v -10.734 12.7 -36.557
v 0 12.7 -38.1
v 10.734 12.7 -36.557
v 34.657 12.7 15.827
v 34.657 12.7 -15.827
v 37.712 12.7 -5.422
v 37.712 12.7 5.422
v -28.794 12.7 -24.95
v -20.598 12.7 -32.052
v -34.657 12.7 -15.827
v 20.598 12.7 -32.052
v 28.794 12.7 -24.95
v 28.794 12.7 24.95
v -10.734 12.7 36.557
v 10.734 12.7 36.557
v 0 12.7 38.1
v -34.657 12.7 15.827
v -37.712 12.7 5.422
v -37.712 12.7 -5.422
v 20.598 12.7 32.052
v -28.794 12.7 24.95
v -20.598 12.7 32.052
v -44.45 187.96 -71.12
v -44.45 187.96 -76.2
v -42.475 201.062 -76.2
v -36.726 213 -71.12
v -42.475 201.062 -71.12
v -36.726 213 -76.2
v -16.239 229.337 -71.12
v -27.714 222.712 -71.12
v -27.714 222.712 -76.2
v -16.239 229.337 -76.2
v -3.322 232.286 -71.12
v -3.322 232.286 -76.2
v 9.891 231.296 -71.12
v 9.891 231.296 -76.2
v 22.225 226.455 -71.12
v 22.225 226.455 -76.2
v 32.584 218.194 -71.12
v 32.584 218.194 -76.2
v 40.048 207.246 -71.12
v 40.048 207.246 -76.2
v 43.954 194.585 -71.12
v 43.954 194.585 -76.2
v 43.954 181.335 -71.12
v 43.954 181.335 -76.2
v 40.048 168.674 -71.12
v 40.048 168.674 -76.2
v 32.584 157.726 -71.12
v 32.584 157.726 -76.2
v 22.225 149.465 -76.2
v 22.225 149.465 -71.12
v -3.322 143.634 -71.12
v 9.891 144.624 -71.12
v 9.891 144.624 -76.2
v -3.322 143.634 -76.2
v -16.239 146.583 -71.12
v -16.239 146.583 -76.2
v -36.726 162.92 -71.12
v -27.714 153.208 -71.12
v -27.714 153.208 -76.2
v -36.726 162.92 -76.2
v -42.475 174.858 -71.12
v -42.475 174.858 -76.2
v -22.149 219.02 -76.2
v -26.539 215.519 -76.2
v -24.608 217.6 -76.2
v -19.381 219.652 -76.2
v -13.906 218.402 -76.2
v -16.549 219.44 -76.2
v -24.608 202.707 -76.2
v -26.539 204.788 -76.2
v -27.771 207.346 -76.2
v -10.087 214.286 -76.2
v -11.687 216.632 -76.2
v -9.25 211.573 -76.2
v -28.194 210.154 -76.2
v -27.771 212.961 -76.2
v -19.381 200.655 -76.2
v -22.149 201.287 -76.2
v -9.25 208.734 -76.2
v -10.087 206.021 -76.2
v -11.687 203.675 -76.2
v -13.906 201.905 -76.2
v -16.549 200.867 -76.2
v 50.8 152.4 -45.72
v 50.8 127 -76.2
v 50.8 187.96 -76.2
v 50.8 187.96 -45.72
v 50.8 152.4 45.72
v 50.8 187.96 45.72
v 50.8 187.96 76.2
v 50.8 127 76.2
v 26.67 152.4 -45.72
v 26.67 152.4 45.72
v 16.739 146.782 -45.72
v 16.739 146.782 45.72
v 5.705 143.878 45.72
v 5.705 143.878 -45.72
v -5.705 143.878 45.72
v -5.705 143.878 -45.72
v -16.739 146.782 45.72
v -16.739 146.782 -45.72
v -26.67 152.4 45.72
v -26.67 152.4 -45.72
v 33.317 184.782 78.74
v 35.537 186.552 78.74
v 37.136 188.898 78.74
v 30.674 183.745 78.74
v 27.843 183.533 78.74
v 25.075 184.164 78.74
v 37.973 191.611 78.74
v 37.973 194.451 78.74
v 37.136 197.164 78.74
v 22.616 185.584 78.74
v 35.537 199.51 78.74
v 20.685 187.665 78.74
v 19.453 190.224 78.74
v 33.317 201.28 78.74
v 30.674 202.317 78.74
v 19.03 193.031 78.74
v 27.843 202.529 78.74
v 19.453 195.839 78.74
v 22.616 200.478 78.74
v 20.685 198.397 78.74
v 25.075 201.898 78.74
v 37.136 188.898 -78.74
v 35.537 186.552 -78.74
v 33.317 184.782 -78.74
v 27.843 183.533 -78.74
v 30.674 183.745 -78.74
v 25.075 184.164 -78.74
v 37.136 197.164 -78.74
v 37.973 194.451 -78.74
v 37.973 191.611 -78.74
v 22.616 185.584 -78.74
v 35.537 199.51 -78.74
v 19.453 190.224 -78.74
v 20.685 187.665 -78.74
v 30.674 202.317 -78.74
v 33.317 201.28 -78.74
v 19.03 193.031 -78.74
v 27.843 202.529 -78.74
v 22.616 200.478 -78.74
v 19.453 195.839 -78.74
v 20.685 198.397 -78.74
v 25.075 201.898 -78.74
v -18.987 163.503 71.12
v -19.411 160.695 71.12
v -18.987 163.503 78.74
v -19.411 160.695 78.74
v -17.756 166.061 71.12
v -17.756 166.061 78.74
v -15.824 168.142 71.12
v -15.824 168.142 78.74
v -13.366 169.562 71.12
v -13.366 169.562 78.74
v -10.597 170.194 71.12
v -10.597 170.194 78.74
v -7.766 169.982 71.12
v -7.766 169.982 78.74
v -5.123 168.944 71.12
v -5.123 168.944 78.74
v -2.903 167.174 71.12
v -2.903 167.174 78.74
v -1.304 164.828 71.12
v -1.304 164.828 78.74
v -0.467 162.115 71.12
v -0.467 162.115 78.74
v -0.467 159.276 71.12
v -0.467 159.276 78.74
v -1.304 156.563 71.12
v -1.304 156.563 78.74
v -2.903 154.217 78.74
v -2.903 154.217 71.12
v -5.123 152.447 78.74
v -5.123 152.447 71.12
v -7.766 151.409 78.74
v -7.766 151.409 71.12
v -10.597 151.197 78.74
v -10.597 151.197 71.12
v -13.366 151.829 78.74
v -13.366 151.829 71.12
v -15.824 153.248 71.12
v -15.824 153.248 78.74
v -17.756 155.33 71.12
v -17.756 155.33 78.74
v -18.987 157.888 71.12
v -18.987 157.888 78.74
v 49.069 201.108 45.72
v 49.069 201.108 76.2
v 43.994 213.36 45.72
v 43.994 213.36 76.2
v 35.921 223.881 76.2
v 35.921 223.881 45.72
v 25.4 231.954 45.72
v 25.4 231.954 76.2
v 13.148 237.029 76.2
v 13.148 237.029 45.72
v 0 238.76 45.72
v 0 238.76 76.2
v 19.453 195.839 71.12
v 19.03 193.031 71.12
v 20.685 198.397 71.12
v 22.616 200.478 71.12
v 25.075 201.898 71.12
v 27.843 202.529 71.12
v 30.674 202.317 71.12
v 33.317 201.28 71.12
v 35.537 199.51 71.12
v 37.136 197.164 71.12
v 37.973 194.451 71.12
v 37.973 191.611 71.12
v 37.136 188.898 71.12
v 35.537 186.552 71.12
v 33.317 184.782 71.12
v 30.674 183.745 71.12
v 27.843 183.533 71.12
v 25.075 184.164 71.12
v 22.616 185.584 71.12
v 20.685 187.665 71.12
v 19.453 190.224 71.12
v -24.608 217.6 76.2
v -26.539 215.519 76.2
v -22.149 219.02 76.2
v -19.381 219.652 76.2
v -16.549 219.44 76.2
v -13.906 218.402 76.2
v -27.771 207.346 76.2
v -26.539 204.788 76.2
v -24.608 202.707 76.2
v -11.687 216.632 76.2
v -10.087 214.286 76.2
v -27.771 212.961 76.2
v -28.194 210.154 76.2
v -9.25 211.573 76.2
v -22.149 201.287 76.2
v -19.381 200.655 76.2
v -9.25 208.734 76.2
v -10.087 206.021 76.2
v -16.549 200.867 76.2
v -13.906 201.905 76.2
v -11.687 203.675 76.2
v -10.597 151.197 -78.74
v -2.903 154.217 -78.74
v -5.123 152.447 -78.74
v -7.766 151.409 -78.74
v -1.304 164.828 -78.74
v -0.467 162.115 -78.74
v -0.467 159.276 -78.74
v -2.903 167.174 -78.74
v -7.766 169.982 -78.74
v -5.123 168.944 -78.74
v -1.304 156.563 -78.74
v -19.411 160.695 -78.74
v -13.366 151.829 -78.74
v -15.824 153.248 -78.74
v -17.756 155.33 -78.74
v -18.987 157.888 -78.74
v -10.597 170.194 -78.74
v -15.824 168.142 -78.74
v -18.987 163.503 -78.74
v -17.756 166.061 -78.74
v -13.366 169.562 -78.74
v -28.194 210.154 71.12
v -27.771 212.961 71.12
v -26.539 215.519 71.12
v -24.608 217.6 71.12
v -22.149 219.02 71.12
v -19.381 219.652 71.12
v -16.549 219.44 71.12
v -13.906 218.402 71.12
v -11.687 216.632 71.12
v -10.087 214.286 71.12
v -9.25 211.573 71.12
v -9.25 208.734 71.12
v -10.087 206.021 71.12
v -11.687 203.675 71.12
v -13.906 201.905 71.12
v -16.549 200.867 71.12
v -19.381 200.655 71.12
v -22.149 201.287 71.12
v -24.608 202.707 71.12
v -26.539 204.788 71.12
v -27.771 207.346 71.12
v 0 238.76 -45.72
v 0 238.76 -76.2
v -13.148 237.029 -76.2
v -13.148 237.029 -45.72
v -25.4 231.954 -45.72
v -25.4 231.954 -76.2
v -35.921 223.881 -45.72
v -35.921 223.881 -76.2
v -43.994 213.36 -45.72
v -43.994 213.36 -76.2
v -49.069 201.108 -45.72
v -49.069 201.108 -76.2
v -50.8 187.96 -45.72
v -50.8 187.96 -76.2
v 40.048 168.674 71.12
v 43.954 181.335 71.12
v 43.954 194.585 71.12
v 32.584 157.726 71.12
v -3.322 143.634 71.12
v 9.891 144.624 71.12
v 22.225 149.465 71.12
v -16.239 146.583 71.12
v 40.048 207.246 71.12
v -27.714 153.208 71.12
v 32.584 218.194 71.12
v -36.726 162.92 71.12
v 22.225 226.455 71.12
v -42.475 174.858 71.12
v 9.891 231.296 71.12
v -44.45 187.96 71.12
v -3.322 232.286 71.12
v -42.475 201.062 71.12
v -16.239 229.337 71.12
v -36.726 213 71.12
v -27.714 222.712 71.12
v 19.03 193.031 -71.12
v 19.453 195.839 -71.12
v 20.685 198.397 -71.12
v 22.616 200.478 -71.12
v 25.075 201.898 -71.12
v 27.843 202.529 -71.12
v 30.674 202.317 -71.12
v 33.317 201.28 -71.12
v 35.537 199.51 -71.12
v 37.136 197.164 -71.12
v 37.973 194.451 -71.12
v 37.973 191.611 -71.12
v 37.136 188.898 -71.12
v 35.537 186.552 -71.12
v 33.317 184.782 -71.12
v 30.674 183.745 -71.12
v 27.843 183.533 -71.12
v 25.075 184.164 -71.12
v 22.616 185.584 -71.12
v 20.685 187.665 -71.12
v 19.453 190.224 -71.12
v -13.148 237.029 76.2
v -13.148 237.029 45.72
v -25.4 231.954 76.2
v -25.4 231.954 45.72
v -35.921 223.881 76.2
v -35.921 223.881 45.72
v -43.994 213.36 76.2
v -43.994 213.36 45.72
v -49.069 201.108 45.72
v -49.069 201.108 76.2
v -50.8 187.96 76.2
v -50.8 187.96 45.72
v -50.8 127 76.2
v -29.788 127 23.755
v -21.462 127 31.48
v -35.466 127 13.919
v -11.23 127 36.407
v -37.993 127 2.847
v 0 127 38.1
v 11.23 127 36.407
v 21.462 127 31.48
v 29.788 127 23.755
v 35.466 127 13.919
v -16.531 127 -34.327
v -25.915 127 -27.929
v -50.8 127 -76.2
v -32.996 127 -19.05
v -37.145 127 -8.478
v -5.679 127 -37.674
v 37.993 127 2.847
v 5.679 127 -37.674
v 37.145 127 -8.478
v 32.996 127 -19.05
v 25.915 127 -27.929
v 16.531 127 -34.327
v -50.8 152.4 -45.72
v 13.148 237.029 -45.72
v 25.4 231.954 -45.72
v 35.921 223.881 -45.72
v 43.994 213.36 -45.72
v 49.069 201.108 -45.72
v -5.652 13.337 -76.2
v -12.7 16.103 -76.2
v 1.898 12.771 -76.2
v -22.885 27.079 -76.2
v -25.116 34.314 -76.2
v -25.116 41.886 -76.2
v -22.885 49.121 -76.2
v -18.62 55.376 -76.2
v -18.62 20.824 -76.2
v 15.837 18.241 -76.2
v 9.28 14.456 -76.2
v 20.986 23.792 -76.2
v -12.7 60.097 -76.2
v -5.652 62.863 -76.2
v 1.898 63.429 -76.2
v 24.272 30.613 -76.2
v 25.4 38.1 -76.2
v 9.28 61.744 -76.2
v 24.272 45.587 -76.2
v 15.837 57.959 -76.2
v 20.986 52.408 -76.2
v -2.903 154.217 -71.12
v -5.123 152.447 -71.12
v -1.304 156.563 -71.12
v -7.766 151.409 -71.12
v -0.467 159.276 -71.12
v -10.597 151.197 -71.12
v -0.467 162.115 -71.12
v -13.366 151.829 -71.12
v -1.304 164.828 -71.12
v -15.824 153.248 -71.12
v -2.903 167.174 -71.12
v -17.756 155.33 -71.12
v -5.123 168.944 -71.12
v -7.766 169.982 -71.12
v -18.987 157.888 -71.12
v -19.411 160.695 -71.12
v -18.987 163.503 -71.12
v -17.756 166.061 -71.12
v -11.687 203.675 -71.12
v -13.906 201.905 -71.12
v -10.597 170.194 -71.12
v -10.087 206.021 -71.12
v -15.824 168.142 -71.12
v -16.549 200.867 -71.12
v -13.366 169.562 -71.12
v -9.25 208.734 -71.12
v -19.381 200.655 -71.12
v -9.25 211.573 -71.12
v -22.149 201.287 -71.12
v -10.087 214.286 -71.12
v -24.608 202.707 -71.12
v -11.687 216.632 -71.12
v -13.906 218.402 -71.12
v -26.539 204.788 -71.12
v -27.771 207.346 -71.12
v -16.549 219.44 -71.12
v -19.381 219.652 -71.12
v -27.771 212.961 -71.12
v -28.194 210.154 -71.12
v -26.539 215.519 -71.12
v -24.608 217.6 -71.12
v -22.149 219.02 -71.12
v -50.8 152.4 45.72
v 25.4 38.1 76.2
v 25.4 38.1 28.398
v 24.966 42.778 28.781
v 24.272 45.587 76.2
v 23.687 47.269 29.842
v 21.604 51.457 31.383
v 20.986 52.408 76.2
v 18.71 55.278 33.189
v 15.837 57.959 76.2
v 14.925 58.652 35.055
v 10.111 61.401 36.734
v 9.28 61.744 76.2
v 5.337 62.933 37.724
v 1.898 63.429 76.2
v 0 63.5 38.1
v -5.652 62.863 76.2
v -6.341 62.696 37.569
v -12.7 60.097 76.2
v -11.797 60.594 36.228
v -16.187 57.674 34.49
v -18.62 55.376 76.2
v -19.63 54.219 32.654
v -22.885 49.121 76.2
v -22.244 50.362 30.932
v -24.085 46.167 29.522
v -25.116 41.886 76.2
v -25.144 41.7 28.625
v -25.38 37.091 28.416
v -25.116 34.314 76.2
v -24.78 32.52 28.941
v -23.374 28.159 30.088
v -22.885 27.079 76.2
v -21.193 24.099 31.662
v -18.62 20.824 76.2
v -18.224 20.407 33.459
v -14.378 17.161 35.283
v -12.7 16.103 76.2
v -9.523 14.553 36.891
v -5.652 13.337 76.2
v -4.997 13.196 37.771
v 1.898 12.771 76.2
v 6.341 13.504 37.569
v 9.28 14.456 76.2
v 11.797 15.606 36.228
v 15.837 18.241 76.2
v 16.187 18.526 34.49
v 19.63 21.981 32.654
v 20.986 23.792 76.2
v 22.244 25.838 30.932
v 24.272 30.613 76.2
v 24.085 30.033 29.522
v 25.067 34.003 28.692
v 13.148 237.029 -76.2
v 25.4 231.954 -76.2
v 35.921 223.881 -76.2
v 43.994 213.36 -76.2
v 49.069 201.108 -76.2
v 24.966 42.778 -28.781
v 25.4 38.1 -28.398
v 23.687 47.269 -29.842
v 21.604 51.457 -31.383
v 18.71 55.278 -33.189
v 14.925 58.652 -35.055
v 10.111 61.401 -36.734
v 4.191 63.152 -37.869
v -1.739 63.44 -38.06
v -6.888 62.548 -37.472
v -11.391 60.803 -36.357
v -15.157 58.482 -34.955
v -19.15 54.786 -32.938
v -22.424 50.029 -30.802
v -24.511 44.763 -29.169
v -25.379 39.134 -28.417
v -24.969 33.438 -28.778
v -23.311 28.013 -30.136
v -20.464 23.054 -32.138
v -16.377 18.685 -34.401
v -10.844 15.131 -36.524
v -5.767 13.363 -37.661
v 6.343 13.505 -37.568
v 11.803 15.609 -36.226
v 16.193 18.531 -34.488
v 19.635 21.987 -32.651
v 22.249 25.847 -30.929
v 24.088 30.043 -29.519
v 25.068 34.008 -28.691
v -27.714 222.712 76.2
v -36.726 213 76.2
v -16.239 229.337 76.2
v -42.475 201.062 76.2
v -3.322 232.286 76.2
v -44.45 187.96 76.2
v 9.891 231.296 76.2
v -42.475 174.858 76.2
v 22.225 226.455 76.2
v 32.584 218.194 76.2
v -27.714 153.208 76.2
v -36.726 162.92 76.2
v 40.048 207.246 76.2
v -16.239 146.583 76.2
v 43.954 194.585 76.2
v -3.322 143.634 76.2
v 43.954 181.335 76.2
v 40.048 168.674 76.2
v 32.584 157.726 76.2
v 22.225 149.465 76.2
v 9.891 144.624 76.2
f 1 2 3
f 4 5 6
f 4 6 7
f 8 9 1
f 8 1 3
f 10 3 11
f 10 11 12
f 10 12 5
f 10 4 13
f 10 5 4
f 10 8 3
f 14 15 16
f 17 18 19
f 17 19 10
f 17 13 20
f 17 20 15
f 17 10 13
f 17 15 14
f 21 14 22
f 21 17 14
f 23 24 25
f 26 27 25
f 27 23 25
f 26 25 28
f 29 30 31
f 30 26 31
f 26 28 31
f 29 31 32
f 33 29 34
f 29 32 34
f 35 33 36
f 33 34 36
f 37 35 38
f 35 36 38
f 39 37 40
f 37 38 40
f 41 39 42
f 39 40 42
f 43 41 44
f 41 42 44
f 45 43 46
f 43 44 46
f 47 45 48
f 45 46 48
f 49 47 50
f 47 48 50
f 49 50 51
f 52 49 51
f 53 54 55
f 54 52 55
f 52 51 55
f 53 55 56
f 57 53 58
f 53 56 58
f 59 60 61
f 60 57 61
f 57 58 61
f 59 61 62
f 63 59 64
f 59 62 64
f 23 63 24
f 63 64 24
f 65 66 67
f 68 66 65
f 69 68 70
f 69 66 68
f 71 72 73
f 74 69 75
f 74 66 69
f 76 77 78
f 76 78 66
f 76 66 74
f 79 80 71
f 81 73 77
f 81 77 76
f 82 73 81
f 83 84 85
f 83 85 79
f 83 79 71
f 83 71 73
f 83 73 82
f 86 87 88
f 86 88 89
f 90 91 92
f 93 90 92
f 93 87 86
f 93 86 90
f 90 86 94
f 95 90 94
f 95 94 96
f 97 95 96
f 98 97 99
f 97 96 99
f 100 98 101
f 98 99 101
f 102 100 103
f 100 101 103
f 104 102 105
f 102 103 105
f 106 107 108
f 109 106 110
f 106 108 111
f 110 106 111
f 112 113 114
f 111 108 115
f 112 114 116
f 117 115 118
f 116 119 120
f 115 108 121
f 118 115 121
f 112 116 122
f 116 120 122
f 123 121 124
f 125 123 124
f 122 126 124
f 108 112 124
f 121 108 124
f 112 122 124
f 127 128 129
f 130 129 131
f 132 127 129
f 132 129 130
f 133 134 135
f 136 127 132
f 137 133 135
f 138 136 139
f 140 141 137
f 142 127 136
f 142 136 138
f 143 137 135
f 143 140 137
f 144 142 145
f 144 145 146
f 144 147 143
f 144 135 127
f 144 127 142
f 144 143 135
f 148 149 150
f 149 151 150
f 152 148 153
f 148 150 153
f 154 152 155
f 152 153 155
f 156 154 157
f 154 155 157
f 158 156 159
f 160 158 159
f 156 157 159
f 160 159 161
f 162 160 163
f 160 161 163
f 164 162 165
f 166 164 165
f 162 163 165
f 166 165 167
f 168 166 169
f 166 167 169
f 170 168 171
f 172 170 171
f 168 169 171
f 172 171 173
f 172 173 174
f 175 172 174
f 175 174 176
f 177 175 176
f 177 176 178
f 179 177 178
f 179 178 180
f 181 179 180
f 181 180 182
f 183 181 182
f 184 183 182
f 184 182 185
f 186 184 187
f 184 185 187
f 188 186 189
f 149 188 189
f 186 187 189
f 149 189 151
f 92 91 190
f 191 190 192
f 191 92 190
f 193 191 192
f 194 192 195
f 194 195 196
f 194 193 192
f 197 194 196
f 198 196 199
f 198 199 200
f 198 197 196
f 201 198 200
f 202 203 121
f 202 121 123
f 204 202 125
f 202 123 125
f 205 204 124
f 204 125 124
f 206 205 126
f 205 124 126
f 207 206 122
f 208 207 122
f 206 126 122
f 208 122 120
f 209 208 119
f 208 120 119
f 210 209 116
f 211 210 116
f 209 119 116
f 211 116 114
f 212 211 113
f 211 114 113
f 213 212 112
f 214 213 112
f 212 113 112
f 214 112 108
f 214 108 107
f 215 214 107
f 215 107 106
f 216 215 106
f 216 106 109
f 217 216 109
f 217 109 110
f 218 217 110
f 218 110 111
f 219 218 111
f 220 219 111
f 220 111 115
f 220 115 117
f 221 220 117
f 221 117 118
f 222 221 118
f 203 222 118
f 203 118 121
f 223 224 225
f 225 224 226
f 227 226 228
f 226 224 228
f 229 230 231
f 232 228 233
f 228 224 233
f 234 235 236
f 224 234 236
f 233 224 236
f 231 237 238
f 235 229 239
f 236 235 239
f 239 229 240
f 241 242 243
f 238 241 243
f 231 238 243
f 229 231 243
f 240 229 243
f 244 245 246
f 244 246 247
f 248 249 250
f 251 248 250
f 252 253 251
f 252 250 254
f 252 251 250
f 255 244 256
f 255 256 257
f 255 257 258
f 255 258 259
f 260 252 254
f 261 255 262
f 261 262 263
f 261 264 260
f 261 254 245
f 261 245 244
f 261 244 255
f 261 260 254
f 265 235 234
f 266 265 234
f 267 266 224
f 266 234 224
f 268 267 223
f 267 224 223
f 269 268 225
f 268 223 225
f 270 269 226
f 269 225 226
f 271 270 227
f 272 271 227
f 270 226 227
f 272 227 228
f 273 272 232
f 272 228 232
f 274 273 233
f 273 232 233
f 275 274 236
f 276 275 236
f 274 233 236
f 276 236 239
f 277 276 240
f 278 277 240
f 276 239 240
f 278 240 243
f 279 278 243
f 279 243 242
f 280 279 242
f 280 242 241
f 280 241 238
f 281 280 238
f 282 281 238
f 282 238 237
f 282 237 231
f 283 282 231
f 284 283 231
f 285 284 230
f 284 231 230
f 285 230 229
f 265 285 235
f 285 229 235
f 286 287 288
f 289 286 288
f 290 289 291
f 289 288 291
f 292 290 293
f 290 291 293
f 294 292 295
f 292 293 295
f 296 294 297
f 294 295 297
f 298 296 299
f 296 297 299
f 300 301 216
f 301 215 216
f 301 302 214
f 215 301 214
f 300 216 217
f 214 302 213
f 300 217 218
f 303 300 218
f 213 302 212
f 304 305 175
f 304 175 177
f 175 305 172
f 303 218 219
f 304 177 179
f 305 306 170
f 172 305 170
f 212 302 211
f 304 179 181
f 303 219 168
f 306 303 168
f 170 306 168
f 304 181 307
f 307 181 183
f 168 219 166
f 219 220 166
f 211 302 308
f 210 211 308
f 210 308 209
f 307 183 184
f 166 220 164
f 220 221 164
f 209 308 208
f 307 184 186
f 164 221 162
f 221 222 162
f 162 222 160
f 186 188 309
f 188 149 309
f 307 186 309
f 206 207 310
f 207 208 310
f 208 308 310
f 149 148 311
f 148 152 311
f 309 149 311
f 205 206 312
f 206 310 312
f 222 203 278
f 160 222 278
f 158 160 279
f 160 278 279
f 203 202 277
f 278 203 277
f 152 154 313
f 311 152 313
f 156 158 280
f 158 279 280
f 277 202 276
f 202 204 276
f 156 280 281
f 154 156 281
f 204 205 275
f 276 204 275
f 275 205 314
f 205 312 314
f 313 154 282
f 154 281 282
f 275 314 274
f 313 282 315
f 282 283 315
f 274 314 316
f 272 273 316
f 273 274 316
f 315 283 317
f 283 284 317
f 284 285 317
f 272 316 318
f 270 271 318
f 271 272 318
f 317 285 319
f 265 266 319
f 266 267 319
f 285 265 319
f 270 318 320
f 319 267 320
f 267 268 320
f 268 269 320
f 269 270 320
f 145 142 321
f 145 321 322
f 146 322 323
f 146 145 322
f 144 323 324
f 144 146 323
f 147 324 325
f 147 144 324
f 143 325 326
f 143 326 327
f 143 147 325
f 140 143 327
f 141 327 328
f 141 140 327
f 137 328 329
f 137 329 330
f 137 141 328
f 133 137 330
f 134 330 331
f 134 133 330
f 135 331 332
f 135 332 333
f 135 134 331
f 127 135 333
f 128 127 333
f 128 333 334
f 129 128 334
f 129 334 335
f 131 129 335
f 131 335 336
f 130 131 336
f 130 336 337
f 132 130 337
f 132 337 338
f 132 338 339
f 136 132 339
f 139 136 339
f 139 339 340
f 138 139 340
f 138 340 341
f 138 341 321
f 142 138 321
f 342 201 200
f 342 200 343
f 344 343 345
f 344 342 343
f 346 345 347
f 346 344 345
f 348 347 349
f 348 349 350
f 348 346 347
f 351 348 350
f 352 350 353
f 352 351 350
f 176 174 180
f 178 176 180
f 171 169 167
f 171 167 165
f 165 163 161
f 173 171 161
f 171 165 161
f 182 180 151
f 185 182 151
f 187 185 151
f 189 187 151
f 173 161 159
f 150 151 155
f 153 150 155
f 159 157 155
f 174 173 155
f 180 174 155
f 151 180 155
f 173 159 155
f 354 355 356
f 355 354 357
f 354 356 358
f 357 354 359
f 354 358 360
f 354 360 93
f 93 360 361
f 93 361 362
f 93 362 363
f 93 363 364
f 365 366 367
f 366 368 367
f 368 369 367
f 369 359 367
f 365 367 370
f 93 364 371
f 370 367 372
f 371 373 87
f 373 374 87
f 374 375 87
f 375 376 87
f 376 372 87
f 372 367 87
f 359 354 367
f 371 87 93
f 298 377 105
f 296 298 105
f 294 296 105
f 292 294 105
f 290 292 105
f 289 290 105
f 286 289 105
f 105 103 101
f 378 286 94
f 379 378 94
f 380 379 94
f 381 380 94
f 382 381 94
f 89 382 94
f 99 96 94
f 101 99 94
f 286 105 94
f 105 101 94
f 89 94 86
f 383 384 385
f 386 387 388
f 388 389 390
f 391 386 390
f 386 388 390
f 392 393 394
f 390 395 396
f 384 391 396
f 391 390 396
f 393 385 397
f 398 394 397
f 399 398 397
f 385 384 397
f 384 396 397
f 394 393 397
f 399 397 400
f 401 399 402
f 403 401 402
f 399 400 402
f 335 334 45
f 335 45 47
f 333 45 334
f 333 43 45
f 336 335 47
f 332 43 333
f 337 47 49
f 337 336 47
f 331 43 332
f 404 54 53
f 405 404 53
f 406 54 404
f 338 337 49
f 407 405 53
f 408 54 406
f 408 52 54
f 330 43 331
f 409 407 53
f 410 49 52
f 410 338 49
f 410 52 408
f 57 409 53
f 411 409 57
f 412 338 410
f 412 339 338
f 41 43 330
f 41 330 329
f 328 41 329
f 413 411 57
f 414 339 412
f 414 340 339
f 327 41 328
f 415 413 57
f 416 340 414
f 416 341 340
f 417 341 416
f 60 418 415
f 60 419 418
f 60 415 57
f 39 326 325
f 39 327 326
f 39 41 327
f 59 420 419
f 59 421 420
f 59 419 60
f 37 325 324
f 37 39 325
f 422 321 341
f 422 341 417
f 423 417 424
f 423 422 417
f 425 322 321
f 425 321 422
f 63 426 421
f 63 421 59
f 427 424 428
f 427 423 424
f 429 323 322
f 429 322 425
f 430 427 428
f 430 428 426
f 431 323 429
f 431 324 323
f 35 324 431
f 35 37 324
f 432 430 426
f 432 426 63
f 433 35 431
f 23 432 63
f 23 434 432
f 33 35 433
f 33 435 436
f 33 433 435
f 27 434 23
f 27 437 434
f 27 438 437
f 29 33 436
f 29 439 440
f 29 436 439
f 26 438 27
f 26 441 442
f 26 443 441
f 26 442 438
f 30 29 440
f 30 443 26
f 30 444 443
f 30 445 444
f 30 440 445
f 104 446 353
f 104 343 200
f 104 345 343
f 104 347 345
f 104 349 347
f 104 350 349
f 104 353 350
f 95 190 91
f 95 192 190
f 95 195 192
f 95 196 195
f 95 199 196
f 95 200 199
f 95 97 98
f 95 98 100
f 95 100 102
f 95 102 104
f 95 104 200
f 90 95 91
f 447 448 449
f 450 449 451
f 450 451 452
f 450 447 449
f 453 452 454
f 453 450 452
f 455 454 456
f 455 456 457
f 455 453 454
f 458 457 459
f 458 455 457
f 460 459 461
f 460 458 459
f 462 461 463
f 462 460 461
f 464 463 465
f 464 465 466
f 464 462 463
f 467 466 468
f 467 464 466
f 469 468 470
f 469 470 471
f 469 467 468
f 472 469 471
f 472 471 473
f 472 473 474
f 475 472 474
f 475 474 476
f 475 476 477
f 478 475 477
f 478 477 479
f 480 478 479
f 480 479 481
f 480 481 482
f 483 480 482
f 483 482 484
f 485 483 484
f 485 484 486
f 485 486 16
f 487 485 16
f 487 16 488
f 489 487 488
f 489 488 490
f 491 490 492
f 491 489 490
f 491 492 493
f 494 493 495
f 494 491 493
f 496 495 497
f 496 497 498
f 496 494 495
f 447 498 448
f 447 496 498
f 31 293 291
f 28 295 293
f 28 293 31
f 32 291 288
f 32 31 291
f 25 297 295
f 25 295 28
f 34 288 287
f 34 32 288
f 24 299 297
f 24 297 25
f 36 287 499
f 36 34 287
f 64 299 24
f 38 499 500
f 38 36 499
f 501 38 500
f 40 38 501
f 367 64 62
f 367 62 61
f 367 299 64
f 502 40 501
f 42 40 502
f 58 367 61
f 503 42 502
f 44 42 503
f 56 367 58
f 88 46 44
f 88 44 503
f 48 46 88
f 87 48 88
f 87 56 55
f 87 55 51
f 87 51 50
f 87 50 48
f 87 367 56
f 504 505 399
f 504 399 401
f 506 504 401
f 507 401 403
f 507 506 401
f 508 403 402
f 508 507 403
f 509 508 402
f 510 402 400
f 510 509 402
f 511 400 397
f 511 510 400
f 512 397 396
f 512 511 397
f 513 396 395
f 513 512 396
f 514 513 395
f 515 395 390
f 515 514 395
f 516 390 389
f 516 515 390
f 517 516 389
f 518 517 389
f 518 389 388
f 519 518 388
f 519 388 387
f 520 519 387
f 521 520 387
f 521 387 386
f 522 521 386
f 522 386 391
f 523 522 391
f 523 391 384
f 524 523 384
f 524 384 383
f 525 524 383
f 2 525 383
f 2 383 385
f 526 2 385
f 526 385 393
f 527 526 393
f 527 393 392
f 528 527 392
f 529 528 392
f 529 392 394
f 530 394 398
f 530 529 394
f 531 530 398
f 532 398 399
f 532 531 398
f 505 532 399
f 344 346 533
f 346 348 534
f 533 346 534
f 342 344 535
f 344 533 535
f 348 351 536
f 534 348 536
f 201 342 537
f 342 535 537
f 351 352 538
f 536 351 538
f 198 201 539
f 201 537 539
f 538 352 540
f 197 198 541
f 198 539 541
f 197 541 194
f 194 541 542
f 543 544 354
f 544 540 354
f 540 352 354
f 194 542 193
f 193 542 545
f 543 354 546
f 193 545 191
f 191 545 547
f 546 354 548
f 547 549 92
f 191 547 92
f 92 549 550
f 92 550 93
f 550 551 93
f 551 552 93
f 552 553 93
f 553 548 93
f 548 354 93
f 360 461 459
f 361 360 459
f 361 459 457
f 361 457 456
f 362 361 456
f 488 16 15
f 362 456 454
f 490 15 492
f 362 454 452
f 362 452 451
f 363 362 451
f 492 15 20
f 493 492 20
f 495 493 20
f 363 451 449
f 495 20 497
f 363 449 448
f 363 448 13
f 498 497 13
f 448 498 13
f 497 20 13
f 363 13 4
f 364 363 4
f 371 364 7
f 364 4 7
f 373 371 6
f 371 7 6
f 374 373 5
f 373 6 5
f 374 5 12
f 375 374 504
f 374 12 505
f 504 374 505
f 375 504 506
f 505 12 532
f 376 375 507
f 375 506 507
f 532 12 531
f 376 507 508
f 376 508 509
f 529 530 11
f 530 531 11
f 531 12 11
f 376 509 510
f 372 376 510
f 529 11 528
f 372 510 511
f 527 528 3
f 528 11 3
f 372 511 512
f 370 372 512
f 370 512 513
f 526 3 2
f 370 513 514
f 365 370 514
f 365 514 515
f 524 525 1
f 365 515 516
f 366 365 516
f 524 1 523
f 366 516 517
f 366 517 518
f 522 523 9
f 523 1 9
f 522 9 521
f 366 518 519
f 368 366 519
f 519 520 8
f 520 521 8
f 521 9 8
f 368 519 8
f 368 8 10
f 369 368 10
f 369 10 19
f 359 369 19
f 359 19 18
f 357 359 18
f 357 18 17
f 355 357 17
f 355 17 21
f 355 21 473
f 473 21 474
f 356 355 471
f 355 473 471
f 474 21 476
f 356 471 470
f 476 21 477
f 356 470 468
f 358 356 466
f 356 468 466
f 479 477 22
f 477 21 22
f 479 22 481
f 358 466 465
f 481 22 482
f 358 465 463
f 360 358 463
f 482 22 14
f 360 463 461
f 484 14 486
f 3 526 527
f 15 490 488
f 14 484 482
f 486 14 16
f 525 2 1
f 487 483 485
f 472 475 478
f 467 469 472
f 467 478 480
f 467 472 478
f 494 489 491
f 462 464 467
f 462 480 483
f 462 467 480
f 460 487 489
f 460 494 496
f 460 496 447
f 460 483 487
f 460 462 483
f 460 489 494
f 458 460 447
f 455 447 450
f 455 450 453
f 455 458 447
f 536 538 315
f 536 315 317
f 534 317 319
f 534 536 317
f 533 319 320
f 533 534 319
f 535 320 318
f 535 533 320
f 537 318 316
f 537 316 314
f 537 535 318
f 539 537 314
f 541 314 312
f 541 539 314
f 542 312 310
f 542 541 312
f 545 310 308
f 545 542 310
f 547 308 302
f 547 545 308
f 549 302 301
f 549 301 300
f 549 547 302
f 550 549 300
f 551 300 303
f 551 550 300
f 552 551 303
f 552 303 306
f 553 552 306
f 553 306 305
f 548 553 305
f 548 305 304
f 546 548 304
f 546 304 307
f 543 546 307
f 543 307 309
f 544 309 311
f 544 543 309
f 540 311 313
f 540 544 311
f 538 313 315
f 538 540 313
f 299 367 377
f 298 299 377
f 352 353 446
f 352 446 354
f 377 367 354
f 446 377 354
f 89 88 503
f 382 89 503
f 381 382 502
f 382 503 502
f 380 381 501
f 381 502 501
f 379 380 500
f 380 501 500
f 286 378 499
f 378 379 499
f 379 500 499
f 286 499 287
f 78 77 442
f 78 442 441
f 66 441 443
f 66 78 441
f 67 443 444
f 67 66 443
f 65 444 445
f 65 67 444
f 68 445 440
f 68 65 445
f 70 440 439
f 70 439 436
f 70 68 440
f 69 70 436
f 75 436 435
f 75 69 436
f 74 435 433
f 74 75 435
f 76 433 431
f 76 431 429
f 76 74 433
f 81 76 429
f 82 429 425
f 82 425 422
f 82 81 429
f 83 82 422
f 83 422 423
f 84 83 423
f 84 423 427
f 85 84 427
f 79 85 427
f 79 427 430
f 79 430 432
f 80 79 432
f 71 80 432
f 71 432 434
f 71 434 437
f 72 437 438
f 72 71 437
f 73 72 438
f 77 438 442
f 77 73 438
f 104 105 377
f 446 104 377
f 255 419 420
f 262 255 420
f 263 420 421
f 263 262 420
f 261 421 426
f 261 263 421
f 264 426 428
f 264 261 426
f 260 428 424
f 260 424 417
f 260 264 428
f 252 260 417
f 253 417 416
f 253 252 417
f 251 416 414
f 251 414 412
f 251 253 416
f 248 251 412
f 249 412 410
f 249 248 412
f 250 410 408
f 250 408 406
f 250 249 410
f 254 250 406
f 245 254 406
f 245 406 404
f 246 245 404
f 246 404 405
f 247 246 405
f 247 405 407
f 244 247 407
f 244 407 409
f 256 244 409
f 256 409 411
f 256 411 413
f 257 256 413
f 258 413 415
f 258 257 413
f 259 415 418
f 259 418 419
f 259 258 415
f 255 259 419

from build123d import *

# Parameters (mm, degrees)
SKETCH1_R           = 38.1
BOSS_EXTRUDE1_DEPTH = 127
SKETCH3_R           = 25.4
BOSS_EXTRUDE2_DEPTH = 152.4
SKETCH4_W           = 101.6
SKETCH4_H           = 152.4
BOSS_EXTRUDE3_DEPTH = 10.16
SKETCH5_W           = 101.6
SKETCH5_H           = 30.48
BOSS_EXTRUDE4_DEPTH = 101.6
CUT_EXTRUDE1_DEPTH  = 101.6
SKETCH8_R           = 44.45
SKETCH8_R_2         = 9.525
CUT_EXTRUDE3_DEPTH  = 5.08
BOSS_EXTRUDE6_START = 2.54
SKETCH8_6_R         = 9.525
BOSS_EXTRUDE6_DEPTH = 2.54
BOSS_EXTRUDE7_DEPTH = 121.92
SKETCH11_R          = 38.1
CUT_EXTRUDE5_DEPTH  = 12.7


with BuildPart() as part:
    # Sketch1 → Boss-Extrude1 (new body)
    with BuildSketch(Plane(origin=(0, 0, 0), x_dir=(1, 0, 0), z_dir=(0, 1, 0))):
        with Locations(Location((0, 0, 0), (0, 0, 270))):
            Circle(SKETCH1_R)
    extrude(amount=BOSS_EXTRUDE1_DEPTH)

    # Sketch3 → Boss-Extrude2 (add)
    with BuildSketch(Plane.XY.offset(76.2)):
        with Locations((0, 38.1)):
            Circle(SKETCH3_R)
    extrude(amount=-BOSS_EXTRUDE2_DEPTH)

    # Sketch4 → Boss-Extrude3 (add)
    with BuildSketch(Plane(origin=(0, 127, 0), x_dir=(1, 0, 0), z_dir=(0, 1, 0))):
        Rectangle(SKETCH4_W, SKETCH4_H)
    extrude(amount=BOSS_EXTRUDE3_DEPTH)

    # Sketch5 → Boss-Extrude4 (add)
    with BuildSketch(Plane(origin=(0, 137.16, 0), x_dir=(1, 0, 0), z_dir=(0, 1, 0))):
        with Locations((0, 60.96)):
            Rectangle(SKETCH5_W, SKETCH5_H)
    boss_extrude4 = extrude(amount=BOSS_EXTRUDE4_DEPTH)

    # Sketch7 → Cut-Extrude1 (cut)
    with BuildSketch(Plane(origin=(0, 0, -76.2), x_dir=(-1, 0, 0), z_dir=(0, 0, -1))):
        with BuildLine():
            ThreePointArc((-50.8, 187.96), (-35.92102454, 223.881024429), (-1.57e-07, 238.76))
            Line((-1.57e-07, 238.76), (-50.8, 238.76))
            Line((-50.8, 238.76), (-50.8, 187.96))
        make_face()
        with BuildLine():
            Line((50.8, 187.96), (50.8, 238.76))
            Line((50.8, 238.76), (-1.57e-07, 238.76))
            ThreePointArc((-1.57e-07, 238.76), (35.921024429, 223.88102454), (50.8, 187.96))
        make_face()
    cut_extrude1 = extrude(amount=-CUT_EXTRUDE1_DEPTH, mode=Mode.SUBTRACT)

    # Sketch8 → Cut-Extrude3 (cut)
    with BuildSketch(Plane(origin=(0, 0, -76.2), x_dir=(-1, 0, 0), z_dir=(0, 0, -1))):
        with Locations((0, 187.96)):
            Circle(SKETCH8_R)
        with Locations((-28.554667319, 193.031059488)):
            Circle(SKETCH8_R_2, mode=Mode.SUBTRACT)
        with Locations((9.885667319, 160.695402961)):
            Circle(SKETCH8_R_2, mode=Mode.SUBTRACT)
        with Locations((18.669, 210.153537551)):
            Circle(SKETCH8_R_2, mode=Mode.SUBTRACT)
    cut_extrude3 = extrude(amount=-CUT_EXTRUDE3_DEPTH, mode=Mode.SUBTRACT)

    # Sketch8<6> → Boss-Extrude6 (add)
    with BuildSketch(Plane(origin=(0, 0, -76.2), x_dir=(-1, 0, 0), z_dir=(0, 0, -1)).offset(BOSS_EXTRUDE6_START)):
        with Locations((-28.554667319, 193.031059488)):
            Circle(SKETCH8_6_R)
        with Locations((9.885667319, 160.695402961)):
            Circle(SKETCH8_6_R)
    boss_extrude6 = extrude(amount=-BOSS_EXTRUDE6_DEPTH)

    # Mirror2: Boss-Extrude4, Cut-Extrude1, Cut-Extrude3, Boss-Extrude6 across plane
    add(boss_extrude4.mirror(Plane.XY))
    add(cut_extrude1.mirror(Plane.XY), mode=Mode.SUBTRACT)
    add(cut_extrude3.mirror(Plane.XY), mode=Mode.SUBTRACT)
    add(boss_extrude6.mirror(Plane.XY))

    # Sketch10 → Boss-Extrude7 (add)
    with BuildSketch(Plane(origin=(0, 0, -76.2), x_dir=(-1, 0, 0), z_dir=(0, 0, -1))):
        with BuildLine():
            Line((-50.8, 152.4), (-26.67, 152.4))
            ThreePointArc((-26.67, 152.4), (0, 143.51), (26.67, 152.4))
            Line((26.67, 152.4), (50.8, 152.4))
            Line((50.8, 152.4), (50.8, 127))
            Line((50.8, 127), (-50.8, 127))
            Line((-50.8, 127), (-50.8, 152.4))
        make_face()
    extrude(amount=-BOSS_EXTRUDE7_DEPTH)

    # Sketch11 → Cut-Extrude5 (cut)
    with BuildSketch(Plane.XZ):
        with Locations(Location((0, 0, 0), (0, 0, 90))):
            Circle(SKETCH11_R)
    extrude(amount=-CUT_EXTRUDE5_DEPTH, mode=Mode.SUBTRACT)


solid = part.part
